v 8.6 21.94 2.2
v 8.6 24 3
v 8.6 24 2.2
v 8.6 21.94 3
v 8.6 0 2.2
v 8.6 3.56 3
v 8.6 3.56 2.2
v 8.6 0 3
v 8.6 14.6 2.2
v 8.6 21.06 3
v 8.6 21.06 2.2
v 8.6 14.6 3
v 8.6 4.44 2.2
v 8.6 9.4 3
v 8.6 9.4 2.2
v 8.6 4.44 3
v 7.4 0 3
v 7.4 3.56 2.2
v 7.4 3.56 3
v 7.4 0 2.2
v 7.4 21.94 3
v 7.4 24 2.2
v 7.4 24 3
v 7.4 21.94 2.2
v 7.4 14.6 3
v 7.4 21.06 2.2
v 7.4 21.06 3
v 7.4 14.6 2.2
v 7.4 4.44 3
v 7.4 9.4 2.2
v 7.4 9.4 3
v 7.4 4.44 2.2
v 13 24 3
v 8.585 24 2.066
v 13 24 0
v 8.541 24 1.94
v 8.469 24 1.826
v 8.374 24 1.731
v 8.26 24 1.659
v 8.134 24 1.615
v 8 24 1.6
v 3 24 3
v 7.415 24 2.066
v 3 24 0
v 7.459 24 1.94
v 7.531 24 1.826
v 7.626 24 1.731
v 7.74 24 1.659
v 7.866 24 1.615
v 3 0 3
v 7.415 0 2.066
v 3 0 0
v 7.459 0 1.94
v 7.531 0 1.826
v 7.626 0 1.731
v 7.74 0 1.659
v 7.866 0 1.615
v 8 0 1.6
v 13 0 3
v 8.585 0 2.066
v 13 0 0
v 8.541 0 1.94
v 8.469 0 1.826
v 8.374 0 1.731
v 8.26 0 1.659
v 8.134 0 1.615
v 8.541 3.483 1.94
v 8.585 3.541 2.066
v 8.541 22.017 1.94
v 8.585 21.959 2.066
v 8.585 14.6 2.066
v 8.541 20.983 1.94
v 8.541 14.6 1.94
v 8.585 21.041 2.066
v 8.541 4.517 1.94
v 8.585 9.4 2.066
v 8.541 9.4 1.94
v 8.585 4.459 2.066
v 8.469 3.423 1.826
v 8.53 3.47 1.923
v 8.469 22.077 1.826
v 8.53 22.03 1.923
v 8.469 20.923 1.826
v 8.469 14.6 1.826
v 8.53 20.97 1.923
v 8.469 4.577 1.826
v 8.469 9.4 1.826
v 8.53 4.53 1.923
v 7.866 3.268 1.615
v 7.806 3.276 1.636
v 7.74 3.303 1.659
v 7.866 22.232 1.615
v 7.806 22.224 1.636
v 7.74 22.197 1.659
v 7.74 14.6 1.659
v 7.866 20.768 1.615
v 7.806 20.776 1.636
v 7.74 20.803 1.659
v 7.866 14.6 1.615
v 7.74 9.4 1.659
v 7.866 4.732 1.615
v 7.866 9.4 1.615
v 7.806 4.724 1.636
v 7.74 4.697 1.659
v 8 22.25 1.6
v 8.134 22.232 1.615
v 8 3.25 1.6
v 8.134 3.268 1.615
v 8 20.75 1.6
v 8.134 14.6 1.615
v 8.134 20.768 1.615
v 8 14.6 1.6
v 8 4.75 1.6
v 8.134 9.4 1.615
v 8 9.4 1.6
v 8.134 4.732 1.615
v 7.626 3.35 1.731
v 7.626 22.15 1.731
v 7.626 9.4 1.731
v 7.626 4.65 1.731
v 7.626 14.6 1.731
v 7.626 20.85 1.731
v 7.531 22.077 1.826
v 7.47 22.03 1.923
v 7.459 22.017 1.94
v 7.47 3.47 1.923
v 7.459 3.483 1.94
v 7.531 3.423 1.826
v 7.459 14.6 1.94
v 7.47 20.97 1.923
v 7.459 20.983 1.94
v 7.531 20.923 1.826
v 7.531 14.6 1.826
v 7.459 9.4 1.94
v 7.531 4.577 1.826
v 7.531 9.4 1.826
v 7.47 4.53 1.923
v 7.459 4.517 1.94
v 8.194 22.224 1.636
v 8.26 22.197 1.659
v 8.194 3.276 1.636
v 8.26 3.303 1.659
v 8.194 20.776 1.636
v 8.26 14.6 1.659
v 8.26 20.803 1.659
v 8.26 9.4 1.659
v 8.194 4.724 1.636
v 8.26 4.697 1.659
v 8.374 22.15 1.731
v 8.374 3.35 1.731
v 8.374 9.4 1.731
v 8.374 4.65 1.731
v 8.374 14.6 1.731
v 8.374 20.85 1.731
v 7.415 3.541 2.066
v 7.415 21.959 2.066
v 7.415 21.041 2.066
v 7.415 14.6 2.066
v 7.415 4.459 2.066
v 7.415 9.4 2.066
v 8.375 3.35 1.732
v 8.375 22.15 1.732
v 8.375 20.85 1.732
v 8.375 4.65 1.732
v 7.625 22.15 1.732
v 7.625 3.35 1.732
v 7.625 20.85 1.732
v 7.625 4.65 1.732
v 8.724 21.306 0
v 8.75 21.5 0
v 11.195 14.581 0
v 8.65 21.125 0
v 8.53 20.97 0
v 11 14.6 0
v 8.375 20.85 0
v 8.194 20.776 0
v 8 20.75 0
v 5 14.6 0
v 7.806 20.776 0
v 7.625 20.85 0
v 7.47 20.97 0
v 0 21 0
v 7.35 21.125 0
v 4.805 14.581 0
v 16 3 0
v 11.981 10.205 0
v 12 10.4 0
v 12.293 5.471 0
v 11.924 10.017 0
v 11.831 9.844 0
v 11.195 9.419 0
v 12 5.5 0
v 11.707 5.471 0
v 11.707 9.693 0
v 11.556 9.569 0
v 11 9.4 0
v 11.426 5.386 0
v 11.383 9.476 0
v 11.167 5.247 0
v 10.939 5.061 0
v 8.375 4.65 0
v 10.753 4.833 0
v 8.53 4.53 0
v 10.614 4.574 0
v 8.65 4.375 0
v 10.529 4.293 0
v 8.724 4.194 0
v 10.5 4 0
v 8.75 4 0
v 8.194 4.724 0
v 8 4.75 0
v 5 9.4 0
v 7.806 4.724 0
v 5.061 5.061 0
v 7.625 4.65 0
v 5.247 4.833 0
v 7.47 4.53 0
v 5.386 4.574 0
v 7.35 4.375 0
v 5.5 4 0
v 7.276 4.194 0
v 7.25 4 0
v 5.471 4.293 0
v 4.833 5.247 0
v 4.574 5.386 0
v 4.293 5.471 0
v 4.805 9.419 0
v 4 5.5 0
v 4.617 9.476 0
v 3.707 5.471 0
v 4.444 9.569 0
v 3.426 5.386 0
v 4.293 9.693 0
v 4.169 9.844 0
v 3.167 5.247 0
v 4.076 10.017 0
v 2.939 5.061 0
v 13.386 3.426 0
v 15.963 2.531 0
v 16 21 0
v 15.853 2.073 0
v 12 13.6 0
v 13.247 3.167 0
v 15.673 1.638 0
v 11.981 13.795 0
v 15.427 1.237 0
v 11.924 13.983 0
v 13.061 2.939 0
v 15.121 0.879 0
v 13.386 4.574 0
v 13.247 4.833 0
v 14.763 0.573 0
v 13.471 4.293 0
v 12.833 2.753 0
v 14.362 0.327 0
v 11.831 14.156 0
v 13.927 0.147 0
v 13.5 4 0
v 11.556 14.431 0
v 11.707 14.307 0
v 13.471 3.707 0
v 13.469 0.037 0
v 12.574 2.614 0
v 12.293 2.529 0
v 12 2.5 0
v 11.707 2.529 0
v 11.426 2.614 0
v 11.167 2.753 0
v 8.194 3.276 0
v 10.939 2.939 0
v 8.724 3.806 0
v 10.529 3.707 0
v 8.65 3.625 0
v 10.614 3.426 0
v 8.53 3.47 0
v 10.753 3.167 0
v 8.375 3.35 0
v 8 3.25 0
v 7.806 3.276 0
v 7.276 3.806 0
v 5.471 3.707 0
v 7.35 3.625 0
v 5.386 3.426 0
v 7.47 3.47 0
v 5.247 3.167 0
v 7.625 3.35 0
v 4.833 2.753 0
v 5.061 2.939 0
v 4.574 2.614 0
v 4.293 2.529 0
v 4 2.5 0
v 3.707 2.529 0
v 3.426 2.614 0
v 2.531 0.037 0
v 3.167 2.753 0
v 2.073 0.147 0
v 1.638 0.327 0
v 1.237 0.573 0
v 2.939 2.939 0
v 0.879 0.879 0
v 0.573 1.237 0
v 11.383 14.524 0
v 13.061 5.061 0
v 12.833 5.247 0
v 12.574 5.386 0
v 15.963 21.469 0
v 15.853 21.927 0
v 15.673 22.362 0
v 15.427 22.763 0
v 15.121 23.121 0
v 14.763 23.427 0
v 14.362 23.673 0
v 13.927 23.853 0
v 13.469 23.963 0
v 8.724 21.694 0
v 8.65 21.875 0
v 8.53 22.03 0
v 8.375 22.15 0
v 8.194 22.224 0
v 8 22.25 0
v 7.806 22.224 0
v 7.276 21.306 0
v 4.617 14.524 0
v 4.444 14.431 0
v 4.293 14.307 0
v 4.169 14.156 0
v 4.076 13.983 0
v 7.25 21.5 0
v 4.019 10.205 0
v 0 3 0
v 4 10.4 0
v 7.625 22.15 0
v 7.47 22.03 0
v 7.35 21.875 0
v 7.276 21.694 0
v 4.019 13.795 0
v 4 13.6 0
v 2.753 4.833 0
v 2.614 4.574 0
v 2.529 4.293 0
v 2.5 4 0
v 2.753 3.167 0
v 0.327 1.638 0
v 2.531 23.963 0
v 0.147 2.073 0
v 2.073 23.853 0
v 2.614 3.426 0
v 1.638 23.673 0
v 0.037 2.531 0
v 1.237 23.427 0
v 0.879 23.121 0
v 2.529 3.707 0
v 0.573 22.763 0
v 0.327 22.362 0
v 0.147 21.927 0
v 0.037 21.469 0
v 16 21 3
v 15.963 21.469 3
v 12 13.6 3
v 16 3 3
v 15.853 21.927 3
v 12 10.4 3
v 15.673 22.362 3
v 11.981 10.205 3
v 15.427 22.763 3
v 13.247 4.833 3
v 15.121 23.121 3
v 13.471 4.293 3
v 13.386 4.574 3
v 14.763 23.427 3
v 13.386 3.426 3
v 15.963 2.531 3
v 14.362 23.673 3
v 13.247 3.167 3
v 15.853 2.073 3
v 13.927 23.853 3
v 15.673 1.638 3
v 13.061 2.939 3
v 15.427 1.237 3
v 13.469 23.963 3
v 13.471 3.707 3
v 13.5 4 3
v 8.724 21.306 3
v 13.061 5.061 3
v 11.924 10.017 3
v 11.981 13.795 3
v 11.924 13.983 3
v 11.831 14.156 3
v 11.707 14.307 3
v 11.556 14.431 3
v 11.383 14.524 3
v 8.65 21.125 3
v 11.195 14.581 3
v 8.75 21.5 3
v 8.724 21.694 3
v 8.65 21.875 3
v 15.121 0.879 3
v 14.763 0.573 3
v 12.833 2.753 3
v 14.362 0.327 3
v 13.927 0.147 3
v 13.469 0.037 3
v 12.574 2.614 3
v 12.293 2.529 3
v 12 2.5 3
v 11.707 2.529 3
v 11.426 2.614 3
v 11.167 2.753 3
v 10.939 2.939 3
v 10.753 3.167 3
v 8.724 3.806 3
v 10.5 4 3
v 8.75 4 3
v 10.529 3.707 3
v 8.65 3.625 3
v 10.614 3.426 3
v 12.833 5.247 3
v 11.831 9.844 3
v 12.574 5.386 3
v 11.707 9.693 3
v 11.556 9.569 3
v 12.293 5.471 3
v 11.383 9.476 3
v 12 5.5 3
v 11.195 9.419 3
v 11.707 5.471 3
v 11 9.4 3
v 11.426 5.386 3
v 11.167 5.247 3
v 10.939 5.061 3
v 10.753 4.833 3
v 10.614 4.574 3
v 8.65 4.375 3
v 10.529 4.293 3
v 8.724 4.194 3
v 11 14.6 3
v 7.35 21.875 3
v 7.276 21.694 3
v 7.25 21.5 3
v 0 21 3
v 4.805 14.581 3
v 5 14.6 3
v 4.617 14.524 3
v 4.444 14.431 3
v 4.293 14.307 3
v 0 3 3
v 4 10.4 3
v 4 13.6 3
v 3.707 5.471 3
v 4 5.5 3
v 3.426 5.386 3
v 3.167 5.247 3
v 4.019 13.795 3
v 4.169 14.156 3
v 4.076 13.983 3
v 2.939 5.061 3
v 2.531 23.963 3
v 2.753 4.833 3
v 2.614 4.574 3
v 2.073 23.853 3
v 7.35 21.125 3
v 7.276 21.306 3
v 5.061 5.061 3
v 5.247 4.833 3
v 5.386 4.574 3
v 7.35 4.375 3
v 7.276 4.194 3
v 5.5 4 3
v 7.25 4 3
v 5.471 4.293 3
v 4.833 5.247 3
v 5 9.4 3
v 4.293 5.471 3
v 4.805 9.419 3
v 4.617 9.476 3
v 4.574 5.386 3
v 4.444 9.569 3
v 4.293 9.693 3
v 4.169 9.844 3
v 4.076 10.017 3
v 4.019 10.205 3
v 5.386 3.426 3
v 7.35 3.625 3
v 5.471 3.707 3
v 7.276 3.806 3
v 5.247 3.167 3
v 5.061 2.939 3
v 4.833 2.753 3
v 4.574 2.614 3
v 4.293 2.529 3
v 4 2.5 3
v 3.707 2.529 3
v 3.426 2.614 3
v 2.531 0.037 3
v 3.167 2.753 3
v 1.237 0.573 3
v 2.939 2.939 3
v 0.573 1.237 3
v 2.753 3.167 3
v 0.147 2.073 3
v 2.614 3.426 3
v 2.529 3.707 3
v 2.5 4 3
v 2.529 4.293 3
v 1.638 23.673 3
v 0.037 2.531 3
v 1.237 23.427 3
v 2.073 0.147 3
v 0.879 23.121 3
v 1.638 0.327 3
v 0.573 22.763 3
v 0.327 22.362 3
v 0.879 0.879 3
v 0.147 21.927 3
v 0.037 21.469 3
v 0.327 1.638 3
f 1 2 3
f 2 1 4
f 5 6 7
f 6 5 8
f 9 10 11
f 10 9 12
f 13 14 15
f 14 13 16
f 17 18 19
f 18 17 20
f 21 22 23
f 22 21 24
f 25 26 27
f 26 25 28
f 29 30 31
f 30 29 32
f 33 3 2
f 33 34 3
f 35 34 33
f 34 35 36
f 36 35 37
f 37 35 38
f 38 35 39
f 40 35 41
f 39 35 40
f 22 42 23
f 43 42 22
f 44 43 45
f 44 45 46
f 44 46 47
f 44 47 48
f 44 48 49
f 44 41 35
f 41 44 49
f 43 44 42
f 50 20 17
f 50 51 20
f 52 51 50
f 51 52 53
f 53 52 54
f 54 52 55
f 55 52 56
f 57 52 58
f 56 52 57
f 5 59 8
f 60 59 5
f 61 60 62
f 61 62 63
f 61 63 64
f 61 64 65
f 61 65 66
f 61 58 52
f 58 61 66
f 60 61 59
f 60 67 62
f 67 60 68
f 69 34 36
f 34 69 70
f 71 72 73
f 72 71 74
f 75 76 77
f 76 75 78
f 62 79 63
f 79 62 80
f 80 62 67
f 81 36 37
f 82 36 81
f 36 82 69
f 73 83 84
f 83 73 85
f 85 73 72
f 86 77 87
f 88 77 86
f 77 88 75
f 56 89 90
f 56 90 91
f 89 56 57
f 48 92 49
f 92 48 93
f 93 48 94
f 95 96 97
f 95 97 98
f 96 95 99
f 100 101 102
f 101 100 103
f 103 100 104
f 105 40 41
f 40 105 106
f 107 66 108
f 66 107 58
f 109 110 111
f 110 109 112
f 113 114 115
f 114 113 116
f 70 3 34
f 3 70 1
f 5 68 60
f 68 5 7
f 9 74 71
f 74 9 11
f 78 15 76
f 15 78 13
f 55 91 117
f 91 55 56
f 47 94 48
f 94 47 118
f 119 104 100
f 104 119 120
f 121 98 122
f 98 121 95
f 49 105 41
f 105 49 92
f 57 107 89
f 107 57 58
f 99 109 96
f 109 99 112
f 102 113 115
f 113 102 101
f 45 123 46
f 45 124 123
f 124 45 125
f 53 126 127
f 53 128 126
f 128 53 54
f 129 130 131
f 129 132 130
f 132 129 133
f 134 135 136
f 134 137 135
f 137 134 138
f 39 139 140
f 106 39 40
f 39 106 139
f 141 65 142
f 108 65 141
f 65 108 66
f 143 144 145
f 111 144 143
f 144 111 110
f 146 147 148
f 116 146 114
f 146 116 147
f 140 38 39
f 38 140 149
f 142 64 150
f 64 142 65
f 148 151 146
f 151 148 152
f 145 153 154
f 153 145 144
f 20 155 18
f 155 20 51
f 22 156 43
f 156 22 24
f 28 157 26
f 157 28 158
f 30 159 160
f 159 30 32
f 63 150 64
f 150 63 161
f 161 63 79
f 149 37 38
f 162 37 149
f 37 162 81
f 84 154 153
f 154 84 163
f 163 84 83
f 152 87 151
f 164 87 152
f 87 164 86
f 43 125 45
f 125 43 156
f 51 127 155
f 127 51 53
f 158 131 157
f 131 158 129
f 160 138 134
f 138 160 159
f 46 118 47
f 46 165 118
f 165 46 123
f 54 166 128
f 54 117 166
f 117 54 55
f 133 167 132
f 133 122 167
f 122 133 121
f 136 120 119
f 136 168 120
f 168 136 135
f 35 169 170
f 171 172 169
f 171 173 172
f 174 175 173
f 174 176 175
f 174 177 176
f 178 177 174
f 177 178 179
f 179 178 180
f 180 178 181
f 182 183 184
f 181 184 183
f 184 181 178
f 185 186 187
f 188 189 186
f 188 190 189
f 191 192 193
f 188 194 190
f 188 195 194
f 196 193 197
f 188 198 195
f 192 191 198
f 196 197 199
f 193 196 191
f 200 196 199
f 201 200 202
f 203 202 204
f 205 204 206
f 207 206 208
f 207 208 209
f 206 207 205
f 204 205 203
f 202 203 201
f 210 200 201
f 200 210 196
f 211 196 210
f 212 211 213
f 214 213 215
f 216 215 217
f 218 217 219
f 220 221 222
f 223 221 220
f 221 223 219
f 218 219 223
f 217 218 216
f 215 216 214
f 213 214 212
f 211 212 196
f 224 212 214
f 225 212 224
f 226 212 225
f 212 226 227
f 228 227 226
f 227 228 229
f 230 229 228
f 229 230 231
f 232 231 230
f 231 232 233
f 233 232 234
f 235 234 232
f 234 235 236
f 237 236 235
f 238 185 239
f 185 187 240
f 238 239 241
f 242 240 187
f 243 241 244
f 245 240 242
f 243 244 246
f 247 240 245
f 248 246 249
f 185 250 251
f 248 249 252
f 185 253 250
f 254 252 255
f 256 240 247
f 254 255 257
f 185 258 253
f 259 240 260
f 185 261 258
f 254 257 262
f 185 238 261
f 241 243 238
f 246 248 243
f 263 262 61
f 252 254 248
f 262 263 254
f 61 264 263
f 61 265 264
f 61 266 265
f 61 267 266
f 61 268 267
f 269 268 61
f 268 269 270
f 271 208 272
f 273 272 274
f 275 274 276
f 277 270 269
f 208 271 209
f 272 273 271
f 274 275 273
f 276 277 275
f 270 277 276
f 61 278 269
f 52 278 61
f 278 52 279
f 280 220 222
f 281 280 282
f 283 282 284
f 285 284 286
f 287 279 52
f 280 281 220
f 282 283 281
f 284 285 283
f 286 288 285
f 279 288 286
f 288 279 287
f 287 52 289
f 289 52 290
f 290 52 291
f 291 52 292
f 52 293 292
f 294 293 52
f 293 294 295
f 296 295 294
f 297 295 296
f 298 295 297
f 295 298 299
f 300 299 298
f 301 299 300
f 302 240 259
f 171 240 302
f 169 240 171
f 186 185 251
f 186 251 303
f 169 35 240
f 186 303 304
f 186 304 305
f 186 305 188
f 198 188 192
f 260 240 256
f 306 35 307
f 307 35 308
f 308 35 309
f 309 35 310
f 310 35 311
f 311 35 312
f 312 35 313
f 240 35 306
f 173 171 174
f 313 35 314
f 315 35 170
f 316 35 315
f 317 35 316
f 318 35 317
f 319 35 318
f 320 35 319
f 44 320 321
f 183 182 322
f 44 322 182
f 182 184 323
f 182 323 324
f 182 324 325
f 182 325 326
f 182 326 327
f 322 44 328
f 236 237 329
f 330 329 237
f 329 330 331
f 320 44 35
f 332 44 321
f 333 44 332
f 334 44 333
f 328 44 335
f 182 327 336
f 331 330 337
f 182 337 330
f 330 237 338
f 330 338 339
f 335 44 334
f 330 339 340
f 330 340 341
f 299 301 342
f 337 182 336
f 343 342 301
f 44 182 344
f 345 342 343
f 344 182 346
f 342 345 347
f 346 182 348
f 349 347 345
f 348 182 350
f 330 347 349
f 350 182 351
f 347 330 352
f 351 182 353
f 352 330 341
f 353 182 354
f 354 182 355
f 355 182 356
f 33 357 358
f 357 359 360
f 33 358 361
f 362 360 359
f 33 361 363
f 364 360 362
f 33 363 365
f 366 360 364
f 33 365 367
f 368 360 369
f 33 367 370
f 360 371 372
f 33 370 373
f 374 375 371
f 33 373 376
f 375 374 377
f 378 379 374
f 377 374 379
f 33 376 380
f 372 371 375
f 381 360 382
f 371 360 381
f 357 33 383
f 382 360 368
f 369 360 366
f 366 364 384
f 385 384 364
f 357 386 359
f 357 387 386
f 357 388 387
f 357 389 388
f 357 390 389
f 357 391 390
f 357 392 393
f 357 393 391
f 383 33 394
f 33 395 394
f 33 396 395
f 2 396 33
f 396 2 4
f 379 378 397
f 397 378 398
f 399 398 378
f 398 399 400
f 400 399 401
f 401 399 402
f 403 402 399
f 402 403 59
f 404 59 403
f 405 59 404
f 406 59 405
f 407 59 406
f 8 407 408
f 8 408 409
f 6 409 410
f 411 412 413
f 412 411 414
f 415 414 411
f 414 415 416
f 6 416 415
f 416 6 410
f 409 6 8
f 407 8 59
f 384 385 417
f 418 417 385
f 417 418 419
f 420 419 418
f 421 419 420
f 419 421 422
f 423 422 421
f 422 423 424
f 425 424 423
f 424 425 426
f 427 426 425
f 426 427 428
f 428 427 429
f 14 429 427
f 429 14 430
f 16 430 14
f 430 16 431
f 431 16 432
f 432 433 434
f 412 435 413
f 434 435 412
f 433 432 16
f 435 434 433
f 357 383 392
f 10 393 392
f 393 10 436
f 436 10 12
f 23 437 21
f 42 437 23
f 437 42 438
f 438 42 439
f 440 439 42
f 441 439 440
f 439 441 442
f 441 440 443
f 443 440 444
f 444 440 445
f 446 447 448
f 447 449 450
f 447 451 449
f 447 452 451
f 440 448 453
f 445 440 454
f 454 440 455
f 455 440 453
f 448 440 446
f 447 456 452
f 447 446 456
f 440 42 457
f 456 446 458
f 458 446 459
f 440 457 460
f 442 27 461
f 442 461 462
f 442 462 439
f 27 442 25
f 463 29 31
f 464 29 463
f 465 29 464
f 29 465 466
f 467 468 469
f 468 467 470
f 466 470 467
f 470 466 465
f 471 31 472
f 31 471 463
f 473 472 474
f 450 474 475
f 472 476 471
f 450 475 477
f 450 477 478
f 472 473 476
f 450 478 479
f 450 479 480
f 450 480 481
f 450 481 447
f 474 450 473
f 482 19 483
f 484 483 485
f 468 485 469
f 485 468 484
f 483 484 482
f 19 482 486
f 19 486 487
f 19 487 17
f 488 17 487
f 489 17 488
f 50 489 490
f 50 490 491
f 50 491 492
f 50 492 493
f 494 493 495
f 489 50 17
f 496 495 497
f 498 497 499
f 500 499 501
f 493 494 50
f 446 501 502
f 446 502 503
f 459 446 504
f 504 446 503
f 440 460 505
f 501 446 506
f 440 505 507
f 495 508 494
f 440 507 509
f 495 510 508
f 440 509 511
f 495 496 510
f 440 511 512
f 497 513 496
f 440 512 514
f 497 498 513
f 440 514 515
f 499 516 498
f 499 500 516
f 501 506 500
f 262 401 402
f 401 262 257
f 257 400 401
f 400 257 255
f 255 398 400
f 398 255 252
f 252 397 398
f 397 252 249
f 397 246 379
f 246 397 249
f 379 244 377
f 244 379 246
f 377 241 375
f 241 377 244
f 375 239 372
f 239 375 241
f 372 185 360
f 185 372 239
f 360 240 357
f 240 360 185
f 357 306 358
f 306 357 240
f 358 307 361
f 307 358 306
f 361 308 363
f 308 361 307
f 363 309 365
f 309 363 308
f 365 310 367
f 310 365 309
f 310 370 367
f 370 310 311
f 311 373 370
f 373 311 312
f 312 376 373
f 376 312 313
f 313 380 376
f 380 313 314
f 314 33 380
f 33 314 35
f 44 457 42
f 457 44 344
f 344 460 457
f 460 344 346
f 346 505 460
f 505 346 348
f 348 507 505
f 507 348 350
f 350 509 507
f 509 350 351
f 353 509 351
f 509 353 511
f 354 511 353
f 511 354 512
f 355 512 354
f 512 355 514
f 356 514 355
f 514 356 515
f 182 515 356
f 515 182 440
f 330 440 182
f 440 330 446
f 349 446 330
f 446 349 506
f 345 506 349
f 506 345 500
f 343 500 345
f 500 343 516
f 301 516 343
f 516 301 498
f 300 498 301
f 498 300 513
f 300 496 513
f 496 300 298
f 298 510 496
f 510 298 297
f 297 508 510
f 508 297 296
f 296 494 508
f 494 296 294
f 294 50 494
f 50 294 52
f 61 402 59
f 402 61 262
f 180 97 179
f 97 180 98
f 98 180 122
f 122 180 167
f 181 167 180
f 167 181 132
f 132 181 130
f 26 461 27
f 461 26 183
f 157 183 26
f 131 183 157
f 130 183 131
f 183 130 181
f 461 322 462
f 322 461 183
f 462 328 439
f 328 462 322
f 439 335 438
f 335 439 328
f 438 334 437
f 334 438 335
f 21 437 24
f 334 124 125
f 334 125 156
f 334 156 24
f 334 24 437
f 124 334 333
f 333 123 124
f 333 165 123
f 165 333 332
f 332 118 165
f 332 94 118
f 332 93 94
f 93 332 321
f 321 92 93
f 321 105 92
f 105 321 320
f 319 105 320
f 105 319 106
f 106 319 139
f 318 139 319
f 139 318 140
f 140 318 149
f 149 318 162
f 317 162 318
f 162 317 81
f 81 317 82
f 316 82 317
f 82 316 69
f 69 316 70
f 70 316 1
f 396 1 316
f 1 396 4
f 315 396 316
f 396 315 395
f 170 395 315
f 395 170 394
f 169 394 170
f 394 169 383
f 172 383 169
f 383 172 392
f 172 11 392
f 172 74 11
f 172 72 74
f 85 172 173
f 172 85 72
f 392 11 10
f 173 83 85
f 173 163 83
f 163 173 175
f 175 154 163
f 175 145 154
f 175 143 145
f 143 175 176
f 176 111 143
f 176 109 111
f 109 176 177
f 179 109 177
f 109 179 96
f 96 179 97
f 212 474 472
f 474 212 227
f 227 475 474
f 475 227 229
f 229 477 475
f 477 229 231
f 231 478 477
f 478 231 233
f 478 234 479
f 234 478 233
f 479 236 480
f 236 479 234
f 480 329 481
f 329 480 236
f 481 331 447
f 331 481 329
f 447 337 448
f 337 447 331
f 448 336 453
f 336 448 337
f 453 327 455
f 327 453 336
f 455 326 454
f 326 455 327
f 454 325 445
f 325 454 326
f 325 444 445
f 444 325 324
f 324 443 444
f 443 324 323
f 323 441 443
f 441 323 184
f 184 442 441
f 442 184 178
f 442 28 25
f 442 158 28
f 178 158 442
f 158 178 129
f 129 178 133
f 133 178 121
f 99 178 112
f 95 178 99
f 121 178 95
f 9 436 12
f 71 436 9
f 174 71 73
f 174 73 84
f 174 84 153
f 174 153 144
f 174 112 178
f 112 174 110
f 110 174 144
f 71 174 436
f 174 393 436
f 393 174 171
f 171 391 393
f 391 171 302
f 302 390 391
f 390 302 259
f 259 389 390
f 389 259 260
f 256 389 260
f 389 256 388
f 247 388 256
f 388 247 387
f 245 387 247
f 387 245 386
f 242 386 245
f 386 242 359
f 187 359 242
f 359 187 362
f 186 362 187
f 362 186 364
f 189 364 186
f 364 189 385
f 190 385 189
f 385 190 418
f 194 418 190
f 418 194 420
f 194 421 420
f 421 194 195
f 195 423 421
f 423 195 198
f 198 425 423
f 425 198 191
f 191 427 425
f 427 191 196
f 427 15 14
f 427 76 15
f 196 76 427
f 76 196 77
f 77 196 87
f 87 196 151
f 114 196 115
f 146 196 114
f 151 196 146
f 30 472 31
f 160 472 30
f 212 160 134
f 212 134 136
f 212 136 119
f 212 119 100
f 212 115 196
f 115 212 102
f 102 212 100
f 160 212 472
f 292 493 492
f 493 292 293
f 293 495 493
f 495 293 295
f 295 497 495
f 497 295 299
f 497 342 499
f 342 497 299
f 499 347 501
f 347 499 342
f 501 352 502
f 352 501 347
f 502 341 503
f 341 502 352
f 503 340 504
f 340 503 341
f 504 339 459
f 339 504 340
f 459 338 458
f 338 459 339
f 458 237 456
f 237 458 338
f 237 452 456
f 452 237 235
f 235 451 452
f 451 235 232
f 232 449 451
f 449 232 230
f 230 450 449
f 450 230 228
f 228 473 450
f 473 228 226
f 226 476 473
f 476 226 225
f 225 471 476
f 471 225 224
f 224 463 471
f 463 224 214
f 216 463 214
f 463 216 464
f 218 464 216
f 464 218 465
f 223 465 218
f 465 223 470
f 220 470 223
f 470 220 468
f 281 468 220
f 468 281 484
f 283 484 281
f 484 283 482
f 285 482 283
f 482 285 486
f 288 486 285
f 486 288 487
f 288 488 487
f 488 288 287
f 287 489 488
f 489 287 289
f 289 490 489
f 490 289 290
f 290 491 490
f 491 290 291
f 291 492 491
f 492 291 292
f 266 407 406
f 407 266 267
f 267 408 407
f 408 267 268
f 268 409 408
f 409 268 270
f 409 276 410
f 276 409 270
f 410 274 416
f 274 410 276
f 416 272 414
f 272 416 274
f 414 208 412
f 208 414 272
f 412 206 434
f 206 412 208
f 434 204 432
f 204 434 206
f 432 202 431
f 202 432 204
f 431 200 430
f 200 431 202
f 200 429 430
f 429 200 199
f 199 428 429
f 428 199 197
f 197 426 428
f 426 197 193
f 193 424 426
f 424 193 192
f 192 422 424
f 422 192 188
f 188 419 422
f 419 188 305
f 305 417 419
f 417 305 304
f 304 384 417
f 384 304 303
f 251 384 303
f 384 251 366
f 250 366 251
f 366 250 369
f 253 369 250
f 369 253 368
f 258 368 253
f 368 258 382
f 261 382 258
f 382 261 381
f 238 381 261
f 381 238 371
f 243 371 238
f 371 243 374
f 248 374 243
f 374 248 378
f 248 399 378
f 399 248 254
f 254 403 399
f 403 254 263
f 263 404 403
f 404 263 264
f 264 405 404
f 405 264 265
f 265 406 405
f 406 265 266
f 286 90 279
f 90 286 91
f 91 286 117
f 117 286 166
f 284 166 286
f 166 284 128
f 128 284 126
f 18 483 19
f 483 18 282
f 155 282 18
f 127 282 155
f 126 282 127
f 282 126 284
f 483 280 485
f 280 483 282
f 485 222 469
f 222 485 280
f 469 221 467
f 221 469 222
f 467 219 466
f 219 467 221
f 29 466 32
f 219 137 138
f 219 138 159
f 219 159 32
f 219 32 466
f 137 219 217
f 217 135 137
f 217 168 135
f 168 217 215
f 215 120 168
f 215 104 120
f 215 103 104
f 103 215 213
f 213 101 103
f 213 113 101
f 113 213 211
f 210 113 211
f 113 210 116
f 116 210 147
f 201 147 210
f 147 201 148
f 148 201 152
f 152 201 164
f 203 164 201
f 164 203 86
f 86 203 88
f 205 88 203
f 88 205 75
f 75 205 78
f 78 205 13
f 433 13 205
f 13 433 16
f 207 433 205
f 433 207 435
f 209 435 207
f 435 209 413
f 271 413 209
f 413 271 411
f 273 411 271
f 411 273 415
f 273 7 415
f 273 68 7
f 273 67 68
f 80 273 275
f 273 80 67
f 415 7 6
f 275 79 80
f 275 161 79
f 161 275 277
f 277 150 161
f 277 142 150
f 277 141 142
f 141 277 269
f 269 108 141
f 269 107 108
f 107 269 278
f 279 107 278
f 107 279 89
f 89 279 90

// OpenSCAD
// part_id: b11
// name: B11 carrier block
// source_drawing_ids: DRW-002
// units: mm
// revision: 0.1
// SPDX-License-Identifier: MIT

module rounded_rect_xy(w = 8, h = 5.2, r = 1.0) {
    hull() {
        for (sx = [-1, 1])
            for (sy = [-1, 1])
                translate([sx * (w / 2 - r), sy * (h / 2 - r)])
                    circle(r = r, $fn = 32);
    }
}

module b11_base_2d(w = 16, h = 24, corner_r = 3) {
    hull() {
        translate([corner_r, corner_r]) circle(r = corner_r, $fn = 40);
        translate([w - corner_r, corner_r]) circle(r = corner_r, $fn = 40);
        translate([corner_r, h - corner_r]) circle(r = corner_r, $fn = 40);
        translate([w - corner_r, h - corner_r]) circle(r = corner_r, $fn = 40);
    }
}

module b11_profile_2d(
    w = 16,
    h = 24,
    corner_r = 3,
    window_w = 8.0,
    window_h = 5.2,
    window_r = 1.0,
    window_bottom_offset = 9.4,
    big_hole_d = 3.0,
    big_hole_spacing = 8.0,
    bottom_hole_offset = 4.0,
    small_hole_r = 0.75,
    small_top_offset = 2.5,
    small_bottom_offset = 4.0
) {
    difference() {
        b11_base_2d(w = w, h = h, corner_r = corner_r);
        translate([w / 2, window_bottom_offset + window_h / 2])
            rounded_rect_xy(w = window_w, h = window_h, r = window_r);
        for (x = [w / 2 - big_hole_spacing / 2, w / 2 + big_hole_spacing / 2])
            translate([x, bottom_hole_offset])
                circle(d = big_hole_d, $fn = 32);
        translate([w / 2, h - small_top_offset])
            circle(r = small_hole_r, $fn = 24);
        translate([w / 2, small_bottom_offset])
            circle(r = small_hole_r, $fn = 24);
    }
}

module b11_slot_segment_3d(
    y0,
    y1,
    x = 8.0,
    top_z = 3.0,
    slot_r = 0.6,
    slot_center_drop = 0.8
) {
    slot_w = 2 * slot_r;
    rect_h = slot_center_drop;
    len = y1 - y0;

    translate([x - slot_w / 2, y0, top_z - rect_h])
        cube([slot_w, len, rect_h + 0.02], center = false);

    translate([x, y0, top_z - slot_center_drop])
        rotate([-90, 0, 0])
            cylinder(r = slot_r, h = len, center = false, $fn = 28);
}

module part_b11(
    w = 16,
    h = 24,
    t = 3.0,
    window_w = 8.0,
    window_h = 5.2,
    window_bottom_offset = 9.4,
    small_top_offset = 2.5,
    small_bottom_offset = 4.0,
    slot_depth = 1.4,
    slot_center_drop = 0.8
) {
    slot_r = slot_depth - slot_center_drop;

    difference() {
        linear_extrude(height = t)
            b11_profile_2d(
                w = w,
                h = h,
                window_w = window_w,
                window_h = window_h,
                window_bottom_offset = window_bottom_offset,
                small_top_offset = small_top_offset,
                small_bottom_offset = small_bottom_offset
            );

        // Full-height center groove: shallow top-face cut, not a through-slot.
        b11_slot_segment_3d(
            y0 = 0,
            y1 = h,
            x = w / 2,
            top_z = t,
            slot_r = slot_r,
            slot_center_drop = slot_center_drop
        );
    }
}

// ---- "main guard" ----
// Default to previewing when opened directly:
if (is_undef(__LIB_MODE__)) {
    part_b11();
}
